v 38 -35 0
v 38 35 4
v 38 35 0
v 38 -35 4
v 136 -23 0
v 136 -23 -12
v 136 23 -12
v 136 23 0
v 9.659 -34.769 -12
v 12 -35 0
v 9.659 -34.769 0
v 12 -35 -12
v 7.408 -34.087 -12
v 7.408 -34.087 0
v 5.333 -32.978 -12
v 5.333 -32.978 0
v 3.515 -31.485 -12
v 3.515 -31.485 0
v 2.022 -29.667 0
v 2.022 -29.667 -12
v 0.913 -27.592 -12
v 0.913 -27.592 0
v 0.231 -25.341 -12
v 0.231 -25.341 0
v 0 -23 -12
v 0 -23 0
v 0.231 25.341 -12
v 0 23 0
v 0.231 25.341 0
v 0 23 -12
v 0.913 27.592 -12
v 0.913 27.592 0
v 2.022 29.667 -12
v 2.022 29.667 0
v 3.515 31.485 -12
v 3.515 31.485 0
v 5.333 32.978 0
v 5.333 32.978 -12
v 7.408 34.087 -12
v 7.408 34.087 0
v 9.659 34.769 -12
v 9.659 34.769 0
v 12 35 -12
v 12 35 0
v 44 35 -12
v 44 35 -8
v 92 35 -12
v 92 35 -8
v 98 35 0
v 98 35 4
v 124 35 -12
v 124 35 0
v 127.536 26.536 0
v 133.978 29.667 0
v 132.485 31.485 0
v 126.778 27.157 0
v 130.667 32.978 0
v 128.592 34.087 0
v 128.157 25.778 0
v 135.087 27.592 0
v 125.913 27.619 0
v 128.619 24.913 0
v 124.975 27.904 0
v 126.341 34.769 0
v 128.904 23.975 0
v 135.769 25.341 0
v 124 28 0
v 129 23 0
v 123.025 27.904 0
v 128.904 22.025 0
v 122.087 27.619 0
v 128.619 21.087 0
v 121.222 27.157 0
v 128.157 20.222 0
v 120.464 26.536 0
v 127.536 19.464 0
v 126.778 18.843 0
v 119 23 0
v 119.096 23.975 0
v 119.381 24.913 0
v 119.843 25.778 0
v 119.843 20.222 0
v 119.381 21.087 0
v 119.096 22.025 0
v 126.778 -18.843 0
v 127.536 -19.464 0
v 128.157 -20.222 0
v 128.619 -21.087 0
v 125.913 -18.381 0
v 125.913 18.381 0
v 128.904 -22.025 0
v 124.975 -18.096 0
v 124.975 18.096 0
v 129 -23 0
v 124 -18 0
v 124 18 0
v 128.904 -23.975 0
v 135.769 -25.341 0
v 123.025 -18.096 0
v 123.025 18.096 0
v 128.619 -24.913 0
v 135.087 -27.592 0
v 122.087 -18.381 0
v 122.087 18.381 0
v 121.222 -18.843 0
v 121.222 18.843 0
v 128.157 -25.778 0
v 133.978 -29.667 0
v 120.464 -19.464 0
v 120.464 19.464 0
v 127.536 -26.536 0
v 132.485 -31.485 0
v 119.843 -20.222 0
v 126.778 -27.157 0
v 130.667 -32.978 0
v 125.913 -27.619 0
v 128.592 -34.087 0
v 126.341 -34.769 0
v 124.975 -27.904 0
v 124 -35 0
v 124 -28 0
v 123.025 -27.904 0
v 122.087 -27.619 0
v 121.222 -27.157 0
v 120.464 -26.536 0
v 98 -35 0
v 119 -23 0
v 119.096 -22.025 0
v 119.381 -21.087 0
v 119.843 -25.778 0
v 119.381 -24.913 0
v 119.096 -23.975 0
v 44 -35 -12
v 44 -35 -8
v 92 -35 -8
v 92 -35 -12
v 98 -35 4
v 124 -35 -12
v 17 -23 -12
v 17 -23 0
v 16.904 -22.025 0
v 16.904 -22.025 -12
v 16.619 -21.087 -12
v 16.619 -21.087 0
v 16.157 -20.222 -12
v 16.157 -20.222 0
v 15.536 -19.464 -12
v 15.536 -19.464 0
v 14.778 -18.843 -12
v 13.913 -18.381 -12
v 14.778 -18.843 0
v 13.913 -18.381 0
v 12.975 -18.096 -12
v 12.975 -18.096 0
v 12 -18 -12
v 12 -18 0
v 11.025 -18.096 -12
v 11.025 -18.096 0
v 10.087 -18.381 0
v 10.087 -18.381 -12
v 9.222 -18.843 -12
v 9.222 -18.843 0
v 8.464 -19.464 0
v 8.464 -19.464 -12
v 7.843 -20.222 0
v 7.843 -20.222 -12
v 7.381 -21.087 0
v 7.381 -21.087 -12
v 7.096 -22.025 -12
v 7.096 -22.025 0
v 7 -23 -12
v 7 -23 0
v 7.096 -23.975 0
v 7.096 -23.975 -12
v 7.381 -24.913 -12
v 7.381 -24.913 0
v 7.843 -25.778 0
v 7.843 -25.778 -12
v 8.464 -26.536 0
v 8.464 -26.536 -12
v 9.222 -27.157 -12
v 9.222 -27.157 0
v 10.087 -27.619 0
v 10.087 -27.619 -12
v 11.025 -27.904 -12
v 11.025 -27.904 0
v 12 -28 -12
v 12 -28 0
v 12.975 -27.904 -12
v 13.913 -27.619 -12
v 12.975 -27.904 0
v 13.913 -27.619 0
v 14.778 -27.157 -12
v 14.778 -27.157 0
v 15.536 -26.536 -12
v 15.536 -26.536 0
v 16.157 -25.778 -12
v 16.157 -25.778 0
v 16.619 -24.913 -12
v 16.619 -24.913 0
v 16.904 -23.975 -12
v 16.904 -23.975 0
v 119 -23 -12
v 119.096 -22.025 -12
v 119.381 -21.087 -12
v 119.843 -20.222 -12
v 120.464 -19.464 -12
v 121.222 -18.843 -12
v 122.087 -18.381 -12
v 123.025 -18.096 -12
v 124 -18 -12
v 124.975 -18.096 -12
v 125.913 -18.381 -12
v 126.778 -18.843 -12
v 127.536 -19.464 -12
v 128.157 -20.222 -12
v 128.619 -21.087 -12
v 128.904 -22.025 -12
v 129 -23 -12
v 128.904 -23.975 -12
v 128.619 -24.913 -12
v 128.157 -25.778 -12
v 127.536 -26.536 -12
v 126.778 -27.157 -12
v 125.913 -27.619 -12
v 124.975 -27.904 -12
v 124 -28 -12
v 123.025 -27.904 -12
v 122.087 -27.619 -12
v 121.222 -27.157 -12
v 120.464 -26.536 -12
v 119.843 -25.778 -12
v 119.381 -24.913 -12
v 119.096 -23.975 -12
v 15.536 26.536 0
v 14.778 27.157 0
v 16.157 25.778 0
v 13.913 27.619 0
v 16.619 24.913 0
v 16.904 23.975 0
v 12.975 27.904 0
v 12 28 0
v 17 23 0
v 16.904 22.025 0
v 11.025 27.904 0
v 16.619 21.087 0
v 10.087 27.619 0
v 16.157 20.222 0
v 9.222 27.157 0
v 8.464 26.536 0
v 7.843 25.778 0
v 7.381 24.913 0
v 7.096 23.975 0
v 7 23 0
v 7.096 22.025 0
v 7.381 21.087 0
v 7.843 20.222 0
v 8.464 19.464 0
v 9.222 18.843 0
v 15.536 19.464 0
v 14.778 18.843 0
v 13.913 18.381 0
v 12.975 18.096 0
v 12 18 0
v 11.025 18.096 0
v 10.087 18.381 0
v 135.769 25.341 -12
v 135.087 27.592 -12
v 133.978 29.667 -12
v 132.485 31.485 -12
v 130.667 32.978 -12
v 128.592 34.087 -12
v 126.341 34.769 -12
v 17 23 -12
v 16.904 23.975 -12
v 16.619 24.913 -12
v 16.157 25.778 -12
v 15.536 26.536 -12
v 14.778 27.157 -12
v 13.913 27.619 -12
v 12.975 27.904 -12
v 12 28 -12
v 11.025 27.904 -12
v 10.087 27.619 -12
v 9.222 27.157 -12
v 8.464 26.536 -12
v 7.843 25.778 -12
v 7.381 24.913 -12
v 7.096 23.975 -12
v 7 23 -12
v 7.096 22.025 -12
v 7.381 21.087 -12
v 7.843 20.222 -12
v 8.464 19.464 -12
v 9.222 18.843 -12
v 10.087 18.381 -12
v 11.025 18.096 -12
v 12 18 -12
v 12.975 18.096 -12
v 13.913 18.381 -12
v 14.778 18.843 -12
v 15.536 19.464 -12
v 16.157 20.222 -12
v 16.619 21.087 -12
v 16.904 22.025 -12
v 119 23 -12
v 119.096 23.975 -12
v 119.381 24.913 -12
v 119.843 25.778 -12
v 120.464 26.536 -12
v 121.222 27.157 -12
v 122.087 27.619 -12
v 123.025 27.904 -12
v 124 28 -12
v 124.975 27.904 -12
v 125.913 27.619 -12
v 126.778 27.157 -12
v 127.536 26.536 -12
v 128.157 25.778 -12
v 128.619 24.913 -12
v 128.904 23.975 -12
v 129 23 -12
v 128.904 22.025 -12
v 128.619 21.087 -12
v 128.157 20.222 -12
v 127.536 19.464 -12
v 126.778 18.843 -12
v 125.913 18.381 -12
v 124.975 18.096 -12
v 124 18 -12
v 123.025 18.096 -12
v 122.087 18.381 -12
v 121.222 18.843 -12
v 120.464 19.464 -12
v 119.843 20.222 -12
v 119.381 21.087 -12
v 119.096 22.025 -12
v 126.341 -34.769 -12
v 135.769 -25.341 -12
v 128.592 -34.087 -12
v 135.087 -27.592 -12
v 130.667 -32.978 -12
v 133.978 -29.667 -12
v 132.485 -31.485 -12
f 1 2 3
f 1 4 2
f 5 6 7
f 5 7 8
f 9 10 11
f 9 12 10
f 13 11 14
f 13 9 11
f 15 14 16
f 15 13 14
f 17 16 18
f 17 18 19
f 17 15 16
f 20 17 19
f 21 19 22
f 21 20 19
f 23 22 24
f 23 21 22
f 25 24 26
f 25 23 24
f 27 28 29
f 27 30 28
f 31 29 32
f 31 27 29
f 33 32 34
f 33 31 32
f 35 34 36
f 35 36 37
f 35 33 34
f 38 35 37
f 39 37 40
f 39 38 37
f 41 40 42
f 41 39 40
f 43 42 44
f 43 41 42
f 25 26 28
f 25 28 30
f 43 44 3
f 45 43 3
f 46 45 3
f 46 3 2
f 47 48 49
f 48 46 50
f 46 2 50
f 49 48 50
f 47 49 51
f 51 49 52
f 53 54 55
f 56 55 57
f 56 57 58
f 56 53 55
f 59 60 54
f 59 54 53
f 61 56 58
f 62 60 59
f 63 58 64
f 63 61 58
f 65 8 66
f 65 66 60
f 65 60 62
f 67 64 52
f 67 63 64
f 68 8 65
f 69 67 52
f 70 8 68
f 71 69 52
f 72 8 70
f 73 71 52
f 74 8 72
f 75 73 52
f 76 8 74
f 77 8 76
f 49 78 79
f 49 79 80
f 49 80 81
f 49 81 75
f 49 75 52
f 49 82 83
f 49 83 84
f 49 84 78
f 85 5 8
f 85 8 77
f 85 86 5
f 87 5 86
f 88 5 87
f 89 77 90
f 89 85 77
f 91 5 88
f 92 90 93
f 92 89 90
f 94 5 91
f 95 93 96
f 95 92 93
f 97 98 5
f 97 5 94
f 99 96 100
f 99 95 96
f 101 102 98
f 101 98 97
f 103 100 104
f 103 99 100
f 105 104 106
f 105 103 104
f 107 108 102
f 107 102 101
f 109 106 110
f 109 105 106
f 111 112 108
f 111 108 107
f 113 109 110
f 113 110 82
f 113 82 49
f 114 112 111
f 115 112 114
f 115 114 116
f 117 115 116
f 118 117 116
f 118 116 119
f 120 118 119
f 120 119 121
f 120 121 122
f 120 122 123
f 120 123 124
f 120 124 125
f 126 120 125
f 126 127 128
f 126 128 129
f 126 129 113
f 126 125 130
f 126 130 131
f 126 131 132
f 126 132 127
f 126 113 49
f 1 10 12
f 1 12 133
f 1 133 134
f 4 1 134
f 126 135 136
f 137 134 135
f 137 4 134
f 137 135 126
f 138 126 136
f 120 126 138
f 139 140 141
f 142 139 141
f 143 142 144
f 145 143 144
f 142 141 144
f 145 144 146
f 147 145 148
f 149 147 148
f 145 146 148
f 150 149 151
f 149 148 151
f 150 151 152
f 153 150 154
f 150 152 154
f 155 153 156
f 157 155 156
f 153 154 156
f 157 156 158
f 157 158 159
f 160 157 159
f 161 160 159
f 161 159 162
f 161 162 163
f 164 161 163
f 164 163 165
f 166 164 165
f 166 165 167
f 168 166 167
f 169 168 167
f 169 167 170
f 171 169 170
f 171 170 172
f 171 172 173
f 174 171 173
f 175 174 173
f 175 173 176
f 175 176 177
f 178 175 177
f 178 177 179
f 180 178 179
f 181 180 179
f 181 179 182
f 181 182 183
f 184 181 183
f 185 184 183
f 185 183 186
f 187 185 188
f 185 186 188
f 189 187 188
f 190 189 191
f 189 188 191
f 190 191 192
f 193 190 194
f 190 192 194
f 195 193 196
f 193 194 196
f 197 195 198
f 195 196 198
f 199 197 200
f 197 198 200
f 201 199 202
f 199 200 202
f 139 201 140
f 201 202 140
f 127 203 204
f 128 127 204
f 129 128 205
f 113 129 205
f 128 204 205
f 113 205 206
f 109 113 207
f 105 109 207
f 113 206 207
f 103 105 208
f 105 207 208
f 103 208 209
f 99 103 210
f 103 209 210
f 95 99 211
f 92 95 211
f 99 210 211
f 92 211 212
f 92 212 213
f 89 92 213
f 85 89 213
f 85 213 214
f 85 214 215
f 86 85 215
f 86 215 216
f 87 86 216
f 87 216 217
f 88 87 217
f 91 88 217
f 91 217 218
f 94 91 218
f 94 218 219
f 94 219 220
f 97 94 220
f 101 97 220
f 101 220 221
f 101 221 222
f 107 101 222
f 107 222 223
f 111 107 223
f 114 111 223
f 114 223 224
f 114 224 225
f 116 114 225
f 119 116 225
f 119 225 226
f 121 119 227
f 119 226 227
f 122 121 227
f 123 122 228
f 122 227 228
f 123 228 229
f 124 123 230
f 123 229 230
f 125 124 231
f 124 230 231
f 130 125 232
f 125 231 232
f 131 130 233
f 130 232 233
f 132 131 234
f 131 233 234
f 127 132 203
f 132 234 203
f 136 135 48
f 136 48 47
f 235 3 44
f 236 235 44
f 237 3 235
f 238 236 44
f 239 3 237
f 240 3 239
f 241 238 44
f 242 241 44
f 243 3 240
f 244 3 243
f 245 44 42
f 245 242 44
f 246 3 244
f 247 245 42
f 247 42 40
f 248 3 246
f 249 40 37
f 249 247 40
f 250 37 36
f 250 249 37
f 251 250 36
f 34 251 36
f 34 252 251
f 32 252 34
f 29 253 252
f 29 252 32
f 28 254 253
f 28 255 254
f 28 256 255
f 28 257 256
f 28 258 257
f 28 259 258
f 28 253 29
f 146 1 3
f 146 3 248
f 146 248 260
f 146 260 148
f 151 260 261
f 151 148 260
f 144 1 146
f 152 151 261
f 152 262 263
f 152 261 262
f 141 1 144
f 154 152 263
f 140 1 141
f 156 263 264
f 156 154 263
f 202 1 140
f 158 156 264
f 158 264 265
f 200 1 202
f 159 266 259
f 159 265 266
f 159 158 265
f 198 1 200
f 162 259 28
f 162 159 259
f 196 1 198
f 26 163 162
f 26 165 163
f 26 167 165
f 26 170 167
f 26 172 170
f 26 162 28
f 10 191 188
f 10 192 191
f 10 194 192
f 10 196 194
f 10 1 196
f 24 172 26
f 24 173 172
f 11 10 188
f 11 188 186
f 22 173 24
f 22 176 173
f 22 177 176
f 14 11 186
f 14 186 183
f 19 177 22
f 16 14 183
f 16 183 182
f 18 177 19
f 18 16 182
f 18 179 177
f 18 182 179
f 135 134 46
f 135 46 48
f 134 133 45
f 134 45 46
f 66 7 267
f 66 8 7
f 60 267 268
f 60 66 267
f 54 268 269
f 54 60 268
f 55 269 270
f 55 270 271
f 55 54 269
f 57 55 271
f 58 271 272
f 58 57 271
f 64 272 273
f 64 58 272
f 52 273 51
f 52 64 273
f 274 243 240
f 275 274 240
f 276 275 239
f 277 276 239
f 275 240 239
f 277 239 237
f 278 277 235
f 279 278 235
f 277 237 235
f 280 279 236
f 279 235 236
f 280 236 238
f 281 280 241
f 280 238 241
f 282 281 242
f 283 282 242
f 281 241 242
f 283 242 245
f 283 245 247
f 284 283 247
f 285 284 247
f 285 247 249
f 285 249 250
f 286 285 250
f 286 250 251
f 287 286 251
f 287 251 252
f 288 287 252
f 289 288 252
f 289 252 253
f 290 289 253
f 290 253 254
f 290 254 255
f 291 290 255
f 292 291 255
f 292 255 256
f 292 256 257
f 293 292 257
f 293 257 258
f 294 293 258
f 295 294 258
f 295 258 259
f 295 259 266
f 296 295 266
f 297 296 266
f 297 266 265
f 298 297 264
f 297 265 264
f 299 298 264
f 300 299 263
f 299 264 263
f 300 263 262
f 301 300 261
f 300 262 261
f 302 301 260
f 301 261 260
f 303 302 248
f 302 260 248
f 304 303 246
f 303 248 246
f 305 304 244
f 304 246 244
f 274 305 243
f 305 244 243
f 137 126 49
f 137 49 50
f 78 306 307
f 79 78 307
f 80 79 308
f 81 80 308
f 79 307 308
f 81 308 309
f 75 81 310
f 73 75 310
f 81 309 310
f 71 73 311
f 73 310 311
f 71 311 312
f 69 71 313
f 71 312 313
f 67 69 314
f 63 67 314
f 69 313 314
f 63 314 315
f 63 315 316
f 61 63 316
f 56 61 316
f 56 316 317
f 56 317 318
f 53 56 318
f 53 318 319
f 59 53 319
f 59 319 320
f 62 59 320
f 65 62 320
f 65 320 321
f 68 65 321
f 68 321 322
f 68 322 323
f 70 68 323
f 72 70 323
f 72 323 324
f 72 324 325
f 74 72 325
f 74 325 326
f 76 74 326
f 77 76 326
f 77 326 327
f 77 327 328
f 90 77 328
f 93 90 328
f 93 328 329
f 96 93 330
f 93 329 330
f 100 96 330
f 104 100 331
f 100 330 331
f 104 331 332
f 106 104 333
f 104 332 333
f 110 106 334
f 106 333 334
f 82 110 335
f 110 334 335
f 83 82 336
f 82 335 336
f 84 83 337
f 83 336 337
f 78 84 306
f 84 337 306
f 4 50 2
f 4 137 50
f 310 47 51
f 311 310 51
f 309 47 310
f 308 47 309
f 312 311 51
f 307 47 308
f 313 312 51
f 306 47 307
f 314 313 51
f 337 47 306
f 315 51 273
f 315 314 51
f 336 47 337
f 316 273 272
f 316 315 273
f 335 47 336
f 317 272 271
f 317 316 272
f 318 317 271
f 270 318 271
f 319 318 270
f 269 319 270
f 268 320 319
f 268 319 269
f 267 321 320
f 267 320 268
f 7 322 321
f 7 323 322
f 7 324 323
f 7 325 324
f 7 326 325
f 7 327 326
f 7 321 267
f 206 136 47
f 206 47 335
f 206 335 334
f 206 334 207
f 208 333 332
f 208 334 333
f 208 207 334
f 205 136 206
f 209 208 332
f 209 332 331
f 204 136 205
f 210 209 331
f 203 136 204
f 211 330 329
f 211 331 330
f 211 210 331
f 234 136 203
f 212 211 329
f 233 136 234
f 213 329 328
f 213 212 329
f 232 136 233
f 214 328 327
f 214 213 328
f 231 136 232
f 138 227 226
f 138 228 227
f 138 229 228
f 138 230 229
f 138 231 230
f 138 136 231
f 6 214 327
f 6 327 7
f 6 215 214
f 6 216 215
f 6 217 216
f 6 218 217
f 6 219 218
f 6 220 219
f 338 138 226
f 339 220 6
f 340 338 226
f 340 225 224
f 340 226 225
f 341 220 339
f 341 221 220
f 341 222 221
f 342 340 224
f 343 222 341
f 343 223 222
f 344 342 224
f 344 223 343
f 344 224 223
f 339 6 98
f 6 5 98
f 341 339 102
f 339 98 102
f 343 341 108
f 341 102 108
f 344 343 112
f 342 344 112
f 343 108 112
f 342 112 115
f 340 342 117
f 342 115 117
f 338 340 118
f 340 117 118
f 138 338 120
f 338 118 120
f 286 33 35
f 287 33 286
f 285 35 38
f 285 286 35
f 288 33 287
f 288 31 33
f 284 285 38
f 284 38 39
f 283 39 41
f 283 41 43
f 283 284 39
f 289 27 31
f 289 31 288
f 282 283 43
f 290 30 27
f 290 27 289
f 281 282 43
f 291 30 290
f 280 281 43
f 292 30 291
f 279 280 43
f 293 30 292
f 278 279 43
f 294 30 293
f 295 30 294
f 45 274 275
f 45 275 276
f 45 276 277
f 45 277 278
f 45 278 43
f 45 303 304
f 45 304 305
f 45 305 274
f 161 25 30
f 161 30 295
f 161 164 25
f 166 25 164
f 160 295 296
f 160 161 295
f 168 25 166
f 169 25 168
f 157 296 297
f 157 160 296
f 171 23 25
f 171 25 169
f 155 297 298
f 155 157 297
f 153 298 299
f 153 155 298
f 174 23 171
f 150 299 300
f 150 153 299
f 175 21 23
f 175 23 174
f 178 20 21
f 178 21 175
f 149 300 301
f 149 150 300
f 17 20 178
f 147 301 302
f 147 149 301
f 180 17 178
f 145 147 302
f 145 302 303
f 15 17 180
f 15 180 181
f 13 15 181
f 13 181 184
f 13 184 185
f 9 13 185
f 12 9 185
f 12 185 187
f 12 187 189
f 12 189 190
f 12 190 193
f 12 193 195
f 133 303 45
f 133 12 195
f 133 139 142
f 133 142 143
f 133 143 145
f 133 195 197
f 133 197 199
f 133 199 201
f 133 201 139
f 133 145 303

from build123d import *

# Parameters (mm, degrees)
F1_DEPTH = 35
F2_R     = 12
F3_R     = 5
F4_DEPTH = 25.4
F6_D     = 10


with BuildPart() as f1:
    # F0 (on Front) → F1 (new body, symmetric)
    with BuildSketch(Plane.XZ):
        Polygon((38, 0), (0, 0), (0, -12), (44, -12), (44, -8), (92, -8), (92, -12), (136, -12), (136, 0), (98, 0), (98, 4), (68, 4), (38, 4), align=None)
    extrude(amount=F1_DEPTH, both=True)

    # F2
    f2_edges = [f1.edges().sort_by_distance(p)[0] for p in [
        (0, -35, -6),
        (136, -35, -6),
        (136, 35, -6),
        (0, 35, -6),
    ]]
    fillet(f2_edges, radius=F2_R)

    # F3 (on face) → F4 (cut)
    with BuildSketch(Plane.XY):
        with Locations((12, 23)):
            Circle(F3_R)
        with Locations((12, -23)):
            Circle(F3_R)
    extrude(amount=-F4_DEPTH, mode=Mode.SUBTRACT)

    # F6 (through all)
    with Locations(Plane.XY):
        with Locations((124, 23), (124, -23)):
            Hole(F6_D / 2)


solid = f1.part
